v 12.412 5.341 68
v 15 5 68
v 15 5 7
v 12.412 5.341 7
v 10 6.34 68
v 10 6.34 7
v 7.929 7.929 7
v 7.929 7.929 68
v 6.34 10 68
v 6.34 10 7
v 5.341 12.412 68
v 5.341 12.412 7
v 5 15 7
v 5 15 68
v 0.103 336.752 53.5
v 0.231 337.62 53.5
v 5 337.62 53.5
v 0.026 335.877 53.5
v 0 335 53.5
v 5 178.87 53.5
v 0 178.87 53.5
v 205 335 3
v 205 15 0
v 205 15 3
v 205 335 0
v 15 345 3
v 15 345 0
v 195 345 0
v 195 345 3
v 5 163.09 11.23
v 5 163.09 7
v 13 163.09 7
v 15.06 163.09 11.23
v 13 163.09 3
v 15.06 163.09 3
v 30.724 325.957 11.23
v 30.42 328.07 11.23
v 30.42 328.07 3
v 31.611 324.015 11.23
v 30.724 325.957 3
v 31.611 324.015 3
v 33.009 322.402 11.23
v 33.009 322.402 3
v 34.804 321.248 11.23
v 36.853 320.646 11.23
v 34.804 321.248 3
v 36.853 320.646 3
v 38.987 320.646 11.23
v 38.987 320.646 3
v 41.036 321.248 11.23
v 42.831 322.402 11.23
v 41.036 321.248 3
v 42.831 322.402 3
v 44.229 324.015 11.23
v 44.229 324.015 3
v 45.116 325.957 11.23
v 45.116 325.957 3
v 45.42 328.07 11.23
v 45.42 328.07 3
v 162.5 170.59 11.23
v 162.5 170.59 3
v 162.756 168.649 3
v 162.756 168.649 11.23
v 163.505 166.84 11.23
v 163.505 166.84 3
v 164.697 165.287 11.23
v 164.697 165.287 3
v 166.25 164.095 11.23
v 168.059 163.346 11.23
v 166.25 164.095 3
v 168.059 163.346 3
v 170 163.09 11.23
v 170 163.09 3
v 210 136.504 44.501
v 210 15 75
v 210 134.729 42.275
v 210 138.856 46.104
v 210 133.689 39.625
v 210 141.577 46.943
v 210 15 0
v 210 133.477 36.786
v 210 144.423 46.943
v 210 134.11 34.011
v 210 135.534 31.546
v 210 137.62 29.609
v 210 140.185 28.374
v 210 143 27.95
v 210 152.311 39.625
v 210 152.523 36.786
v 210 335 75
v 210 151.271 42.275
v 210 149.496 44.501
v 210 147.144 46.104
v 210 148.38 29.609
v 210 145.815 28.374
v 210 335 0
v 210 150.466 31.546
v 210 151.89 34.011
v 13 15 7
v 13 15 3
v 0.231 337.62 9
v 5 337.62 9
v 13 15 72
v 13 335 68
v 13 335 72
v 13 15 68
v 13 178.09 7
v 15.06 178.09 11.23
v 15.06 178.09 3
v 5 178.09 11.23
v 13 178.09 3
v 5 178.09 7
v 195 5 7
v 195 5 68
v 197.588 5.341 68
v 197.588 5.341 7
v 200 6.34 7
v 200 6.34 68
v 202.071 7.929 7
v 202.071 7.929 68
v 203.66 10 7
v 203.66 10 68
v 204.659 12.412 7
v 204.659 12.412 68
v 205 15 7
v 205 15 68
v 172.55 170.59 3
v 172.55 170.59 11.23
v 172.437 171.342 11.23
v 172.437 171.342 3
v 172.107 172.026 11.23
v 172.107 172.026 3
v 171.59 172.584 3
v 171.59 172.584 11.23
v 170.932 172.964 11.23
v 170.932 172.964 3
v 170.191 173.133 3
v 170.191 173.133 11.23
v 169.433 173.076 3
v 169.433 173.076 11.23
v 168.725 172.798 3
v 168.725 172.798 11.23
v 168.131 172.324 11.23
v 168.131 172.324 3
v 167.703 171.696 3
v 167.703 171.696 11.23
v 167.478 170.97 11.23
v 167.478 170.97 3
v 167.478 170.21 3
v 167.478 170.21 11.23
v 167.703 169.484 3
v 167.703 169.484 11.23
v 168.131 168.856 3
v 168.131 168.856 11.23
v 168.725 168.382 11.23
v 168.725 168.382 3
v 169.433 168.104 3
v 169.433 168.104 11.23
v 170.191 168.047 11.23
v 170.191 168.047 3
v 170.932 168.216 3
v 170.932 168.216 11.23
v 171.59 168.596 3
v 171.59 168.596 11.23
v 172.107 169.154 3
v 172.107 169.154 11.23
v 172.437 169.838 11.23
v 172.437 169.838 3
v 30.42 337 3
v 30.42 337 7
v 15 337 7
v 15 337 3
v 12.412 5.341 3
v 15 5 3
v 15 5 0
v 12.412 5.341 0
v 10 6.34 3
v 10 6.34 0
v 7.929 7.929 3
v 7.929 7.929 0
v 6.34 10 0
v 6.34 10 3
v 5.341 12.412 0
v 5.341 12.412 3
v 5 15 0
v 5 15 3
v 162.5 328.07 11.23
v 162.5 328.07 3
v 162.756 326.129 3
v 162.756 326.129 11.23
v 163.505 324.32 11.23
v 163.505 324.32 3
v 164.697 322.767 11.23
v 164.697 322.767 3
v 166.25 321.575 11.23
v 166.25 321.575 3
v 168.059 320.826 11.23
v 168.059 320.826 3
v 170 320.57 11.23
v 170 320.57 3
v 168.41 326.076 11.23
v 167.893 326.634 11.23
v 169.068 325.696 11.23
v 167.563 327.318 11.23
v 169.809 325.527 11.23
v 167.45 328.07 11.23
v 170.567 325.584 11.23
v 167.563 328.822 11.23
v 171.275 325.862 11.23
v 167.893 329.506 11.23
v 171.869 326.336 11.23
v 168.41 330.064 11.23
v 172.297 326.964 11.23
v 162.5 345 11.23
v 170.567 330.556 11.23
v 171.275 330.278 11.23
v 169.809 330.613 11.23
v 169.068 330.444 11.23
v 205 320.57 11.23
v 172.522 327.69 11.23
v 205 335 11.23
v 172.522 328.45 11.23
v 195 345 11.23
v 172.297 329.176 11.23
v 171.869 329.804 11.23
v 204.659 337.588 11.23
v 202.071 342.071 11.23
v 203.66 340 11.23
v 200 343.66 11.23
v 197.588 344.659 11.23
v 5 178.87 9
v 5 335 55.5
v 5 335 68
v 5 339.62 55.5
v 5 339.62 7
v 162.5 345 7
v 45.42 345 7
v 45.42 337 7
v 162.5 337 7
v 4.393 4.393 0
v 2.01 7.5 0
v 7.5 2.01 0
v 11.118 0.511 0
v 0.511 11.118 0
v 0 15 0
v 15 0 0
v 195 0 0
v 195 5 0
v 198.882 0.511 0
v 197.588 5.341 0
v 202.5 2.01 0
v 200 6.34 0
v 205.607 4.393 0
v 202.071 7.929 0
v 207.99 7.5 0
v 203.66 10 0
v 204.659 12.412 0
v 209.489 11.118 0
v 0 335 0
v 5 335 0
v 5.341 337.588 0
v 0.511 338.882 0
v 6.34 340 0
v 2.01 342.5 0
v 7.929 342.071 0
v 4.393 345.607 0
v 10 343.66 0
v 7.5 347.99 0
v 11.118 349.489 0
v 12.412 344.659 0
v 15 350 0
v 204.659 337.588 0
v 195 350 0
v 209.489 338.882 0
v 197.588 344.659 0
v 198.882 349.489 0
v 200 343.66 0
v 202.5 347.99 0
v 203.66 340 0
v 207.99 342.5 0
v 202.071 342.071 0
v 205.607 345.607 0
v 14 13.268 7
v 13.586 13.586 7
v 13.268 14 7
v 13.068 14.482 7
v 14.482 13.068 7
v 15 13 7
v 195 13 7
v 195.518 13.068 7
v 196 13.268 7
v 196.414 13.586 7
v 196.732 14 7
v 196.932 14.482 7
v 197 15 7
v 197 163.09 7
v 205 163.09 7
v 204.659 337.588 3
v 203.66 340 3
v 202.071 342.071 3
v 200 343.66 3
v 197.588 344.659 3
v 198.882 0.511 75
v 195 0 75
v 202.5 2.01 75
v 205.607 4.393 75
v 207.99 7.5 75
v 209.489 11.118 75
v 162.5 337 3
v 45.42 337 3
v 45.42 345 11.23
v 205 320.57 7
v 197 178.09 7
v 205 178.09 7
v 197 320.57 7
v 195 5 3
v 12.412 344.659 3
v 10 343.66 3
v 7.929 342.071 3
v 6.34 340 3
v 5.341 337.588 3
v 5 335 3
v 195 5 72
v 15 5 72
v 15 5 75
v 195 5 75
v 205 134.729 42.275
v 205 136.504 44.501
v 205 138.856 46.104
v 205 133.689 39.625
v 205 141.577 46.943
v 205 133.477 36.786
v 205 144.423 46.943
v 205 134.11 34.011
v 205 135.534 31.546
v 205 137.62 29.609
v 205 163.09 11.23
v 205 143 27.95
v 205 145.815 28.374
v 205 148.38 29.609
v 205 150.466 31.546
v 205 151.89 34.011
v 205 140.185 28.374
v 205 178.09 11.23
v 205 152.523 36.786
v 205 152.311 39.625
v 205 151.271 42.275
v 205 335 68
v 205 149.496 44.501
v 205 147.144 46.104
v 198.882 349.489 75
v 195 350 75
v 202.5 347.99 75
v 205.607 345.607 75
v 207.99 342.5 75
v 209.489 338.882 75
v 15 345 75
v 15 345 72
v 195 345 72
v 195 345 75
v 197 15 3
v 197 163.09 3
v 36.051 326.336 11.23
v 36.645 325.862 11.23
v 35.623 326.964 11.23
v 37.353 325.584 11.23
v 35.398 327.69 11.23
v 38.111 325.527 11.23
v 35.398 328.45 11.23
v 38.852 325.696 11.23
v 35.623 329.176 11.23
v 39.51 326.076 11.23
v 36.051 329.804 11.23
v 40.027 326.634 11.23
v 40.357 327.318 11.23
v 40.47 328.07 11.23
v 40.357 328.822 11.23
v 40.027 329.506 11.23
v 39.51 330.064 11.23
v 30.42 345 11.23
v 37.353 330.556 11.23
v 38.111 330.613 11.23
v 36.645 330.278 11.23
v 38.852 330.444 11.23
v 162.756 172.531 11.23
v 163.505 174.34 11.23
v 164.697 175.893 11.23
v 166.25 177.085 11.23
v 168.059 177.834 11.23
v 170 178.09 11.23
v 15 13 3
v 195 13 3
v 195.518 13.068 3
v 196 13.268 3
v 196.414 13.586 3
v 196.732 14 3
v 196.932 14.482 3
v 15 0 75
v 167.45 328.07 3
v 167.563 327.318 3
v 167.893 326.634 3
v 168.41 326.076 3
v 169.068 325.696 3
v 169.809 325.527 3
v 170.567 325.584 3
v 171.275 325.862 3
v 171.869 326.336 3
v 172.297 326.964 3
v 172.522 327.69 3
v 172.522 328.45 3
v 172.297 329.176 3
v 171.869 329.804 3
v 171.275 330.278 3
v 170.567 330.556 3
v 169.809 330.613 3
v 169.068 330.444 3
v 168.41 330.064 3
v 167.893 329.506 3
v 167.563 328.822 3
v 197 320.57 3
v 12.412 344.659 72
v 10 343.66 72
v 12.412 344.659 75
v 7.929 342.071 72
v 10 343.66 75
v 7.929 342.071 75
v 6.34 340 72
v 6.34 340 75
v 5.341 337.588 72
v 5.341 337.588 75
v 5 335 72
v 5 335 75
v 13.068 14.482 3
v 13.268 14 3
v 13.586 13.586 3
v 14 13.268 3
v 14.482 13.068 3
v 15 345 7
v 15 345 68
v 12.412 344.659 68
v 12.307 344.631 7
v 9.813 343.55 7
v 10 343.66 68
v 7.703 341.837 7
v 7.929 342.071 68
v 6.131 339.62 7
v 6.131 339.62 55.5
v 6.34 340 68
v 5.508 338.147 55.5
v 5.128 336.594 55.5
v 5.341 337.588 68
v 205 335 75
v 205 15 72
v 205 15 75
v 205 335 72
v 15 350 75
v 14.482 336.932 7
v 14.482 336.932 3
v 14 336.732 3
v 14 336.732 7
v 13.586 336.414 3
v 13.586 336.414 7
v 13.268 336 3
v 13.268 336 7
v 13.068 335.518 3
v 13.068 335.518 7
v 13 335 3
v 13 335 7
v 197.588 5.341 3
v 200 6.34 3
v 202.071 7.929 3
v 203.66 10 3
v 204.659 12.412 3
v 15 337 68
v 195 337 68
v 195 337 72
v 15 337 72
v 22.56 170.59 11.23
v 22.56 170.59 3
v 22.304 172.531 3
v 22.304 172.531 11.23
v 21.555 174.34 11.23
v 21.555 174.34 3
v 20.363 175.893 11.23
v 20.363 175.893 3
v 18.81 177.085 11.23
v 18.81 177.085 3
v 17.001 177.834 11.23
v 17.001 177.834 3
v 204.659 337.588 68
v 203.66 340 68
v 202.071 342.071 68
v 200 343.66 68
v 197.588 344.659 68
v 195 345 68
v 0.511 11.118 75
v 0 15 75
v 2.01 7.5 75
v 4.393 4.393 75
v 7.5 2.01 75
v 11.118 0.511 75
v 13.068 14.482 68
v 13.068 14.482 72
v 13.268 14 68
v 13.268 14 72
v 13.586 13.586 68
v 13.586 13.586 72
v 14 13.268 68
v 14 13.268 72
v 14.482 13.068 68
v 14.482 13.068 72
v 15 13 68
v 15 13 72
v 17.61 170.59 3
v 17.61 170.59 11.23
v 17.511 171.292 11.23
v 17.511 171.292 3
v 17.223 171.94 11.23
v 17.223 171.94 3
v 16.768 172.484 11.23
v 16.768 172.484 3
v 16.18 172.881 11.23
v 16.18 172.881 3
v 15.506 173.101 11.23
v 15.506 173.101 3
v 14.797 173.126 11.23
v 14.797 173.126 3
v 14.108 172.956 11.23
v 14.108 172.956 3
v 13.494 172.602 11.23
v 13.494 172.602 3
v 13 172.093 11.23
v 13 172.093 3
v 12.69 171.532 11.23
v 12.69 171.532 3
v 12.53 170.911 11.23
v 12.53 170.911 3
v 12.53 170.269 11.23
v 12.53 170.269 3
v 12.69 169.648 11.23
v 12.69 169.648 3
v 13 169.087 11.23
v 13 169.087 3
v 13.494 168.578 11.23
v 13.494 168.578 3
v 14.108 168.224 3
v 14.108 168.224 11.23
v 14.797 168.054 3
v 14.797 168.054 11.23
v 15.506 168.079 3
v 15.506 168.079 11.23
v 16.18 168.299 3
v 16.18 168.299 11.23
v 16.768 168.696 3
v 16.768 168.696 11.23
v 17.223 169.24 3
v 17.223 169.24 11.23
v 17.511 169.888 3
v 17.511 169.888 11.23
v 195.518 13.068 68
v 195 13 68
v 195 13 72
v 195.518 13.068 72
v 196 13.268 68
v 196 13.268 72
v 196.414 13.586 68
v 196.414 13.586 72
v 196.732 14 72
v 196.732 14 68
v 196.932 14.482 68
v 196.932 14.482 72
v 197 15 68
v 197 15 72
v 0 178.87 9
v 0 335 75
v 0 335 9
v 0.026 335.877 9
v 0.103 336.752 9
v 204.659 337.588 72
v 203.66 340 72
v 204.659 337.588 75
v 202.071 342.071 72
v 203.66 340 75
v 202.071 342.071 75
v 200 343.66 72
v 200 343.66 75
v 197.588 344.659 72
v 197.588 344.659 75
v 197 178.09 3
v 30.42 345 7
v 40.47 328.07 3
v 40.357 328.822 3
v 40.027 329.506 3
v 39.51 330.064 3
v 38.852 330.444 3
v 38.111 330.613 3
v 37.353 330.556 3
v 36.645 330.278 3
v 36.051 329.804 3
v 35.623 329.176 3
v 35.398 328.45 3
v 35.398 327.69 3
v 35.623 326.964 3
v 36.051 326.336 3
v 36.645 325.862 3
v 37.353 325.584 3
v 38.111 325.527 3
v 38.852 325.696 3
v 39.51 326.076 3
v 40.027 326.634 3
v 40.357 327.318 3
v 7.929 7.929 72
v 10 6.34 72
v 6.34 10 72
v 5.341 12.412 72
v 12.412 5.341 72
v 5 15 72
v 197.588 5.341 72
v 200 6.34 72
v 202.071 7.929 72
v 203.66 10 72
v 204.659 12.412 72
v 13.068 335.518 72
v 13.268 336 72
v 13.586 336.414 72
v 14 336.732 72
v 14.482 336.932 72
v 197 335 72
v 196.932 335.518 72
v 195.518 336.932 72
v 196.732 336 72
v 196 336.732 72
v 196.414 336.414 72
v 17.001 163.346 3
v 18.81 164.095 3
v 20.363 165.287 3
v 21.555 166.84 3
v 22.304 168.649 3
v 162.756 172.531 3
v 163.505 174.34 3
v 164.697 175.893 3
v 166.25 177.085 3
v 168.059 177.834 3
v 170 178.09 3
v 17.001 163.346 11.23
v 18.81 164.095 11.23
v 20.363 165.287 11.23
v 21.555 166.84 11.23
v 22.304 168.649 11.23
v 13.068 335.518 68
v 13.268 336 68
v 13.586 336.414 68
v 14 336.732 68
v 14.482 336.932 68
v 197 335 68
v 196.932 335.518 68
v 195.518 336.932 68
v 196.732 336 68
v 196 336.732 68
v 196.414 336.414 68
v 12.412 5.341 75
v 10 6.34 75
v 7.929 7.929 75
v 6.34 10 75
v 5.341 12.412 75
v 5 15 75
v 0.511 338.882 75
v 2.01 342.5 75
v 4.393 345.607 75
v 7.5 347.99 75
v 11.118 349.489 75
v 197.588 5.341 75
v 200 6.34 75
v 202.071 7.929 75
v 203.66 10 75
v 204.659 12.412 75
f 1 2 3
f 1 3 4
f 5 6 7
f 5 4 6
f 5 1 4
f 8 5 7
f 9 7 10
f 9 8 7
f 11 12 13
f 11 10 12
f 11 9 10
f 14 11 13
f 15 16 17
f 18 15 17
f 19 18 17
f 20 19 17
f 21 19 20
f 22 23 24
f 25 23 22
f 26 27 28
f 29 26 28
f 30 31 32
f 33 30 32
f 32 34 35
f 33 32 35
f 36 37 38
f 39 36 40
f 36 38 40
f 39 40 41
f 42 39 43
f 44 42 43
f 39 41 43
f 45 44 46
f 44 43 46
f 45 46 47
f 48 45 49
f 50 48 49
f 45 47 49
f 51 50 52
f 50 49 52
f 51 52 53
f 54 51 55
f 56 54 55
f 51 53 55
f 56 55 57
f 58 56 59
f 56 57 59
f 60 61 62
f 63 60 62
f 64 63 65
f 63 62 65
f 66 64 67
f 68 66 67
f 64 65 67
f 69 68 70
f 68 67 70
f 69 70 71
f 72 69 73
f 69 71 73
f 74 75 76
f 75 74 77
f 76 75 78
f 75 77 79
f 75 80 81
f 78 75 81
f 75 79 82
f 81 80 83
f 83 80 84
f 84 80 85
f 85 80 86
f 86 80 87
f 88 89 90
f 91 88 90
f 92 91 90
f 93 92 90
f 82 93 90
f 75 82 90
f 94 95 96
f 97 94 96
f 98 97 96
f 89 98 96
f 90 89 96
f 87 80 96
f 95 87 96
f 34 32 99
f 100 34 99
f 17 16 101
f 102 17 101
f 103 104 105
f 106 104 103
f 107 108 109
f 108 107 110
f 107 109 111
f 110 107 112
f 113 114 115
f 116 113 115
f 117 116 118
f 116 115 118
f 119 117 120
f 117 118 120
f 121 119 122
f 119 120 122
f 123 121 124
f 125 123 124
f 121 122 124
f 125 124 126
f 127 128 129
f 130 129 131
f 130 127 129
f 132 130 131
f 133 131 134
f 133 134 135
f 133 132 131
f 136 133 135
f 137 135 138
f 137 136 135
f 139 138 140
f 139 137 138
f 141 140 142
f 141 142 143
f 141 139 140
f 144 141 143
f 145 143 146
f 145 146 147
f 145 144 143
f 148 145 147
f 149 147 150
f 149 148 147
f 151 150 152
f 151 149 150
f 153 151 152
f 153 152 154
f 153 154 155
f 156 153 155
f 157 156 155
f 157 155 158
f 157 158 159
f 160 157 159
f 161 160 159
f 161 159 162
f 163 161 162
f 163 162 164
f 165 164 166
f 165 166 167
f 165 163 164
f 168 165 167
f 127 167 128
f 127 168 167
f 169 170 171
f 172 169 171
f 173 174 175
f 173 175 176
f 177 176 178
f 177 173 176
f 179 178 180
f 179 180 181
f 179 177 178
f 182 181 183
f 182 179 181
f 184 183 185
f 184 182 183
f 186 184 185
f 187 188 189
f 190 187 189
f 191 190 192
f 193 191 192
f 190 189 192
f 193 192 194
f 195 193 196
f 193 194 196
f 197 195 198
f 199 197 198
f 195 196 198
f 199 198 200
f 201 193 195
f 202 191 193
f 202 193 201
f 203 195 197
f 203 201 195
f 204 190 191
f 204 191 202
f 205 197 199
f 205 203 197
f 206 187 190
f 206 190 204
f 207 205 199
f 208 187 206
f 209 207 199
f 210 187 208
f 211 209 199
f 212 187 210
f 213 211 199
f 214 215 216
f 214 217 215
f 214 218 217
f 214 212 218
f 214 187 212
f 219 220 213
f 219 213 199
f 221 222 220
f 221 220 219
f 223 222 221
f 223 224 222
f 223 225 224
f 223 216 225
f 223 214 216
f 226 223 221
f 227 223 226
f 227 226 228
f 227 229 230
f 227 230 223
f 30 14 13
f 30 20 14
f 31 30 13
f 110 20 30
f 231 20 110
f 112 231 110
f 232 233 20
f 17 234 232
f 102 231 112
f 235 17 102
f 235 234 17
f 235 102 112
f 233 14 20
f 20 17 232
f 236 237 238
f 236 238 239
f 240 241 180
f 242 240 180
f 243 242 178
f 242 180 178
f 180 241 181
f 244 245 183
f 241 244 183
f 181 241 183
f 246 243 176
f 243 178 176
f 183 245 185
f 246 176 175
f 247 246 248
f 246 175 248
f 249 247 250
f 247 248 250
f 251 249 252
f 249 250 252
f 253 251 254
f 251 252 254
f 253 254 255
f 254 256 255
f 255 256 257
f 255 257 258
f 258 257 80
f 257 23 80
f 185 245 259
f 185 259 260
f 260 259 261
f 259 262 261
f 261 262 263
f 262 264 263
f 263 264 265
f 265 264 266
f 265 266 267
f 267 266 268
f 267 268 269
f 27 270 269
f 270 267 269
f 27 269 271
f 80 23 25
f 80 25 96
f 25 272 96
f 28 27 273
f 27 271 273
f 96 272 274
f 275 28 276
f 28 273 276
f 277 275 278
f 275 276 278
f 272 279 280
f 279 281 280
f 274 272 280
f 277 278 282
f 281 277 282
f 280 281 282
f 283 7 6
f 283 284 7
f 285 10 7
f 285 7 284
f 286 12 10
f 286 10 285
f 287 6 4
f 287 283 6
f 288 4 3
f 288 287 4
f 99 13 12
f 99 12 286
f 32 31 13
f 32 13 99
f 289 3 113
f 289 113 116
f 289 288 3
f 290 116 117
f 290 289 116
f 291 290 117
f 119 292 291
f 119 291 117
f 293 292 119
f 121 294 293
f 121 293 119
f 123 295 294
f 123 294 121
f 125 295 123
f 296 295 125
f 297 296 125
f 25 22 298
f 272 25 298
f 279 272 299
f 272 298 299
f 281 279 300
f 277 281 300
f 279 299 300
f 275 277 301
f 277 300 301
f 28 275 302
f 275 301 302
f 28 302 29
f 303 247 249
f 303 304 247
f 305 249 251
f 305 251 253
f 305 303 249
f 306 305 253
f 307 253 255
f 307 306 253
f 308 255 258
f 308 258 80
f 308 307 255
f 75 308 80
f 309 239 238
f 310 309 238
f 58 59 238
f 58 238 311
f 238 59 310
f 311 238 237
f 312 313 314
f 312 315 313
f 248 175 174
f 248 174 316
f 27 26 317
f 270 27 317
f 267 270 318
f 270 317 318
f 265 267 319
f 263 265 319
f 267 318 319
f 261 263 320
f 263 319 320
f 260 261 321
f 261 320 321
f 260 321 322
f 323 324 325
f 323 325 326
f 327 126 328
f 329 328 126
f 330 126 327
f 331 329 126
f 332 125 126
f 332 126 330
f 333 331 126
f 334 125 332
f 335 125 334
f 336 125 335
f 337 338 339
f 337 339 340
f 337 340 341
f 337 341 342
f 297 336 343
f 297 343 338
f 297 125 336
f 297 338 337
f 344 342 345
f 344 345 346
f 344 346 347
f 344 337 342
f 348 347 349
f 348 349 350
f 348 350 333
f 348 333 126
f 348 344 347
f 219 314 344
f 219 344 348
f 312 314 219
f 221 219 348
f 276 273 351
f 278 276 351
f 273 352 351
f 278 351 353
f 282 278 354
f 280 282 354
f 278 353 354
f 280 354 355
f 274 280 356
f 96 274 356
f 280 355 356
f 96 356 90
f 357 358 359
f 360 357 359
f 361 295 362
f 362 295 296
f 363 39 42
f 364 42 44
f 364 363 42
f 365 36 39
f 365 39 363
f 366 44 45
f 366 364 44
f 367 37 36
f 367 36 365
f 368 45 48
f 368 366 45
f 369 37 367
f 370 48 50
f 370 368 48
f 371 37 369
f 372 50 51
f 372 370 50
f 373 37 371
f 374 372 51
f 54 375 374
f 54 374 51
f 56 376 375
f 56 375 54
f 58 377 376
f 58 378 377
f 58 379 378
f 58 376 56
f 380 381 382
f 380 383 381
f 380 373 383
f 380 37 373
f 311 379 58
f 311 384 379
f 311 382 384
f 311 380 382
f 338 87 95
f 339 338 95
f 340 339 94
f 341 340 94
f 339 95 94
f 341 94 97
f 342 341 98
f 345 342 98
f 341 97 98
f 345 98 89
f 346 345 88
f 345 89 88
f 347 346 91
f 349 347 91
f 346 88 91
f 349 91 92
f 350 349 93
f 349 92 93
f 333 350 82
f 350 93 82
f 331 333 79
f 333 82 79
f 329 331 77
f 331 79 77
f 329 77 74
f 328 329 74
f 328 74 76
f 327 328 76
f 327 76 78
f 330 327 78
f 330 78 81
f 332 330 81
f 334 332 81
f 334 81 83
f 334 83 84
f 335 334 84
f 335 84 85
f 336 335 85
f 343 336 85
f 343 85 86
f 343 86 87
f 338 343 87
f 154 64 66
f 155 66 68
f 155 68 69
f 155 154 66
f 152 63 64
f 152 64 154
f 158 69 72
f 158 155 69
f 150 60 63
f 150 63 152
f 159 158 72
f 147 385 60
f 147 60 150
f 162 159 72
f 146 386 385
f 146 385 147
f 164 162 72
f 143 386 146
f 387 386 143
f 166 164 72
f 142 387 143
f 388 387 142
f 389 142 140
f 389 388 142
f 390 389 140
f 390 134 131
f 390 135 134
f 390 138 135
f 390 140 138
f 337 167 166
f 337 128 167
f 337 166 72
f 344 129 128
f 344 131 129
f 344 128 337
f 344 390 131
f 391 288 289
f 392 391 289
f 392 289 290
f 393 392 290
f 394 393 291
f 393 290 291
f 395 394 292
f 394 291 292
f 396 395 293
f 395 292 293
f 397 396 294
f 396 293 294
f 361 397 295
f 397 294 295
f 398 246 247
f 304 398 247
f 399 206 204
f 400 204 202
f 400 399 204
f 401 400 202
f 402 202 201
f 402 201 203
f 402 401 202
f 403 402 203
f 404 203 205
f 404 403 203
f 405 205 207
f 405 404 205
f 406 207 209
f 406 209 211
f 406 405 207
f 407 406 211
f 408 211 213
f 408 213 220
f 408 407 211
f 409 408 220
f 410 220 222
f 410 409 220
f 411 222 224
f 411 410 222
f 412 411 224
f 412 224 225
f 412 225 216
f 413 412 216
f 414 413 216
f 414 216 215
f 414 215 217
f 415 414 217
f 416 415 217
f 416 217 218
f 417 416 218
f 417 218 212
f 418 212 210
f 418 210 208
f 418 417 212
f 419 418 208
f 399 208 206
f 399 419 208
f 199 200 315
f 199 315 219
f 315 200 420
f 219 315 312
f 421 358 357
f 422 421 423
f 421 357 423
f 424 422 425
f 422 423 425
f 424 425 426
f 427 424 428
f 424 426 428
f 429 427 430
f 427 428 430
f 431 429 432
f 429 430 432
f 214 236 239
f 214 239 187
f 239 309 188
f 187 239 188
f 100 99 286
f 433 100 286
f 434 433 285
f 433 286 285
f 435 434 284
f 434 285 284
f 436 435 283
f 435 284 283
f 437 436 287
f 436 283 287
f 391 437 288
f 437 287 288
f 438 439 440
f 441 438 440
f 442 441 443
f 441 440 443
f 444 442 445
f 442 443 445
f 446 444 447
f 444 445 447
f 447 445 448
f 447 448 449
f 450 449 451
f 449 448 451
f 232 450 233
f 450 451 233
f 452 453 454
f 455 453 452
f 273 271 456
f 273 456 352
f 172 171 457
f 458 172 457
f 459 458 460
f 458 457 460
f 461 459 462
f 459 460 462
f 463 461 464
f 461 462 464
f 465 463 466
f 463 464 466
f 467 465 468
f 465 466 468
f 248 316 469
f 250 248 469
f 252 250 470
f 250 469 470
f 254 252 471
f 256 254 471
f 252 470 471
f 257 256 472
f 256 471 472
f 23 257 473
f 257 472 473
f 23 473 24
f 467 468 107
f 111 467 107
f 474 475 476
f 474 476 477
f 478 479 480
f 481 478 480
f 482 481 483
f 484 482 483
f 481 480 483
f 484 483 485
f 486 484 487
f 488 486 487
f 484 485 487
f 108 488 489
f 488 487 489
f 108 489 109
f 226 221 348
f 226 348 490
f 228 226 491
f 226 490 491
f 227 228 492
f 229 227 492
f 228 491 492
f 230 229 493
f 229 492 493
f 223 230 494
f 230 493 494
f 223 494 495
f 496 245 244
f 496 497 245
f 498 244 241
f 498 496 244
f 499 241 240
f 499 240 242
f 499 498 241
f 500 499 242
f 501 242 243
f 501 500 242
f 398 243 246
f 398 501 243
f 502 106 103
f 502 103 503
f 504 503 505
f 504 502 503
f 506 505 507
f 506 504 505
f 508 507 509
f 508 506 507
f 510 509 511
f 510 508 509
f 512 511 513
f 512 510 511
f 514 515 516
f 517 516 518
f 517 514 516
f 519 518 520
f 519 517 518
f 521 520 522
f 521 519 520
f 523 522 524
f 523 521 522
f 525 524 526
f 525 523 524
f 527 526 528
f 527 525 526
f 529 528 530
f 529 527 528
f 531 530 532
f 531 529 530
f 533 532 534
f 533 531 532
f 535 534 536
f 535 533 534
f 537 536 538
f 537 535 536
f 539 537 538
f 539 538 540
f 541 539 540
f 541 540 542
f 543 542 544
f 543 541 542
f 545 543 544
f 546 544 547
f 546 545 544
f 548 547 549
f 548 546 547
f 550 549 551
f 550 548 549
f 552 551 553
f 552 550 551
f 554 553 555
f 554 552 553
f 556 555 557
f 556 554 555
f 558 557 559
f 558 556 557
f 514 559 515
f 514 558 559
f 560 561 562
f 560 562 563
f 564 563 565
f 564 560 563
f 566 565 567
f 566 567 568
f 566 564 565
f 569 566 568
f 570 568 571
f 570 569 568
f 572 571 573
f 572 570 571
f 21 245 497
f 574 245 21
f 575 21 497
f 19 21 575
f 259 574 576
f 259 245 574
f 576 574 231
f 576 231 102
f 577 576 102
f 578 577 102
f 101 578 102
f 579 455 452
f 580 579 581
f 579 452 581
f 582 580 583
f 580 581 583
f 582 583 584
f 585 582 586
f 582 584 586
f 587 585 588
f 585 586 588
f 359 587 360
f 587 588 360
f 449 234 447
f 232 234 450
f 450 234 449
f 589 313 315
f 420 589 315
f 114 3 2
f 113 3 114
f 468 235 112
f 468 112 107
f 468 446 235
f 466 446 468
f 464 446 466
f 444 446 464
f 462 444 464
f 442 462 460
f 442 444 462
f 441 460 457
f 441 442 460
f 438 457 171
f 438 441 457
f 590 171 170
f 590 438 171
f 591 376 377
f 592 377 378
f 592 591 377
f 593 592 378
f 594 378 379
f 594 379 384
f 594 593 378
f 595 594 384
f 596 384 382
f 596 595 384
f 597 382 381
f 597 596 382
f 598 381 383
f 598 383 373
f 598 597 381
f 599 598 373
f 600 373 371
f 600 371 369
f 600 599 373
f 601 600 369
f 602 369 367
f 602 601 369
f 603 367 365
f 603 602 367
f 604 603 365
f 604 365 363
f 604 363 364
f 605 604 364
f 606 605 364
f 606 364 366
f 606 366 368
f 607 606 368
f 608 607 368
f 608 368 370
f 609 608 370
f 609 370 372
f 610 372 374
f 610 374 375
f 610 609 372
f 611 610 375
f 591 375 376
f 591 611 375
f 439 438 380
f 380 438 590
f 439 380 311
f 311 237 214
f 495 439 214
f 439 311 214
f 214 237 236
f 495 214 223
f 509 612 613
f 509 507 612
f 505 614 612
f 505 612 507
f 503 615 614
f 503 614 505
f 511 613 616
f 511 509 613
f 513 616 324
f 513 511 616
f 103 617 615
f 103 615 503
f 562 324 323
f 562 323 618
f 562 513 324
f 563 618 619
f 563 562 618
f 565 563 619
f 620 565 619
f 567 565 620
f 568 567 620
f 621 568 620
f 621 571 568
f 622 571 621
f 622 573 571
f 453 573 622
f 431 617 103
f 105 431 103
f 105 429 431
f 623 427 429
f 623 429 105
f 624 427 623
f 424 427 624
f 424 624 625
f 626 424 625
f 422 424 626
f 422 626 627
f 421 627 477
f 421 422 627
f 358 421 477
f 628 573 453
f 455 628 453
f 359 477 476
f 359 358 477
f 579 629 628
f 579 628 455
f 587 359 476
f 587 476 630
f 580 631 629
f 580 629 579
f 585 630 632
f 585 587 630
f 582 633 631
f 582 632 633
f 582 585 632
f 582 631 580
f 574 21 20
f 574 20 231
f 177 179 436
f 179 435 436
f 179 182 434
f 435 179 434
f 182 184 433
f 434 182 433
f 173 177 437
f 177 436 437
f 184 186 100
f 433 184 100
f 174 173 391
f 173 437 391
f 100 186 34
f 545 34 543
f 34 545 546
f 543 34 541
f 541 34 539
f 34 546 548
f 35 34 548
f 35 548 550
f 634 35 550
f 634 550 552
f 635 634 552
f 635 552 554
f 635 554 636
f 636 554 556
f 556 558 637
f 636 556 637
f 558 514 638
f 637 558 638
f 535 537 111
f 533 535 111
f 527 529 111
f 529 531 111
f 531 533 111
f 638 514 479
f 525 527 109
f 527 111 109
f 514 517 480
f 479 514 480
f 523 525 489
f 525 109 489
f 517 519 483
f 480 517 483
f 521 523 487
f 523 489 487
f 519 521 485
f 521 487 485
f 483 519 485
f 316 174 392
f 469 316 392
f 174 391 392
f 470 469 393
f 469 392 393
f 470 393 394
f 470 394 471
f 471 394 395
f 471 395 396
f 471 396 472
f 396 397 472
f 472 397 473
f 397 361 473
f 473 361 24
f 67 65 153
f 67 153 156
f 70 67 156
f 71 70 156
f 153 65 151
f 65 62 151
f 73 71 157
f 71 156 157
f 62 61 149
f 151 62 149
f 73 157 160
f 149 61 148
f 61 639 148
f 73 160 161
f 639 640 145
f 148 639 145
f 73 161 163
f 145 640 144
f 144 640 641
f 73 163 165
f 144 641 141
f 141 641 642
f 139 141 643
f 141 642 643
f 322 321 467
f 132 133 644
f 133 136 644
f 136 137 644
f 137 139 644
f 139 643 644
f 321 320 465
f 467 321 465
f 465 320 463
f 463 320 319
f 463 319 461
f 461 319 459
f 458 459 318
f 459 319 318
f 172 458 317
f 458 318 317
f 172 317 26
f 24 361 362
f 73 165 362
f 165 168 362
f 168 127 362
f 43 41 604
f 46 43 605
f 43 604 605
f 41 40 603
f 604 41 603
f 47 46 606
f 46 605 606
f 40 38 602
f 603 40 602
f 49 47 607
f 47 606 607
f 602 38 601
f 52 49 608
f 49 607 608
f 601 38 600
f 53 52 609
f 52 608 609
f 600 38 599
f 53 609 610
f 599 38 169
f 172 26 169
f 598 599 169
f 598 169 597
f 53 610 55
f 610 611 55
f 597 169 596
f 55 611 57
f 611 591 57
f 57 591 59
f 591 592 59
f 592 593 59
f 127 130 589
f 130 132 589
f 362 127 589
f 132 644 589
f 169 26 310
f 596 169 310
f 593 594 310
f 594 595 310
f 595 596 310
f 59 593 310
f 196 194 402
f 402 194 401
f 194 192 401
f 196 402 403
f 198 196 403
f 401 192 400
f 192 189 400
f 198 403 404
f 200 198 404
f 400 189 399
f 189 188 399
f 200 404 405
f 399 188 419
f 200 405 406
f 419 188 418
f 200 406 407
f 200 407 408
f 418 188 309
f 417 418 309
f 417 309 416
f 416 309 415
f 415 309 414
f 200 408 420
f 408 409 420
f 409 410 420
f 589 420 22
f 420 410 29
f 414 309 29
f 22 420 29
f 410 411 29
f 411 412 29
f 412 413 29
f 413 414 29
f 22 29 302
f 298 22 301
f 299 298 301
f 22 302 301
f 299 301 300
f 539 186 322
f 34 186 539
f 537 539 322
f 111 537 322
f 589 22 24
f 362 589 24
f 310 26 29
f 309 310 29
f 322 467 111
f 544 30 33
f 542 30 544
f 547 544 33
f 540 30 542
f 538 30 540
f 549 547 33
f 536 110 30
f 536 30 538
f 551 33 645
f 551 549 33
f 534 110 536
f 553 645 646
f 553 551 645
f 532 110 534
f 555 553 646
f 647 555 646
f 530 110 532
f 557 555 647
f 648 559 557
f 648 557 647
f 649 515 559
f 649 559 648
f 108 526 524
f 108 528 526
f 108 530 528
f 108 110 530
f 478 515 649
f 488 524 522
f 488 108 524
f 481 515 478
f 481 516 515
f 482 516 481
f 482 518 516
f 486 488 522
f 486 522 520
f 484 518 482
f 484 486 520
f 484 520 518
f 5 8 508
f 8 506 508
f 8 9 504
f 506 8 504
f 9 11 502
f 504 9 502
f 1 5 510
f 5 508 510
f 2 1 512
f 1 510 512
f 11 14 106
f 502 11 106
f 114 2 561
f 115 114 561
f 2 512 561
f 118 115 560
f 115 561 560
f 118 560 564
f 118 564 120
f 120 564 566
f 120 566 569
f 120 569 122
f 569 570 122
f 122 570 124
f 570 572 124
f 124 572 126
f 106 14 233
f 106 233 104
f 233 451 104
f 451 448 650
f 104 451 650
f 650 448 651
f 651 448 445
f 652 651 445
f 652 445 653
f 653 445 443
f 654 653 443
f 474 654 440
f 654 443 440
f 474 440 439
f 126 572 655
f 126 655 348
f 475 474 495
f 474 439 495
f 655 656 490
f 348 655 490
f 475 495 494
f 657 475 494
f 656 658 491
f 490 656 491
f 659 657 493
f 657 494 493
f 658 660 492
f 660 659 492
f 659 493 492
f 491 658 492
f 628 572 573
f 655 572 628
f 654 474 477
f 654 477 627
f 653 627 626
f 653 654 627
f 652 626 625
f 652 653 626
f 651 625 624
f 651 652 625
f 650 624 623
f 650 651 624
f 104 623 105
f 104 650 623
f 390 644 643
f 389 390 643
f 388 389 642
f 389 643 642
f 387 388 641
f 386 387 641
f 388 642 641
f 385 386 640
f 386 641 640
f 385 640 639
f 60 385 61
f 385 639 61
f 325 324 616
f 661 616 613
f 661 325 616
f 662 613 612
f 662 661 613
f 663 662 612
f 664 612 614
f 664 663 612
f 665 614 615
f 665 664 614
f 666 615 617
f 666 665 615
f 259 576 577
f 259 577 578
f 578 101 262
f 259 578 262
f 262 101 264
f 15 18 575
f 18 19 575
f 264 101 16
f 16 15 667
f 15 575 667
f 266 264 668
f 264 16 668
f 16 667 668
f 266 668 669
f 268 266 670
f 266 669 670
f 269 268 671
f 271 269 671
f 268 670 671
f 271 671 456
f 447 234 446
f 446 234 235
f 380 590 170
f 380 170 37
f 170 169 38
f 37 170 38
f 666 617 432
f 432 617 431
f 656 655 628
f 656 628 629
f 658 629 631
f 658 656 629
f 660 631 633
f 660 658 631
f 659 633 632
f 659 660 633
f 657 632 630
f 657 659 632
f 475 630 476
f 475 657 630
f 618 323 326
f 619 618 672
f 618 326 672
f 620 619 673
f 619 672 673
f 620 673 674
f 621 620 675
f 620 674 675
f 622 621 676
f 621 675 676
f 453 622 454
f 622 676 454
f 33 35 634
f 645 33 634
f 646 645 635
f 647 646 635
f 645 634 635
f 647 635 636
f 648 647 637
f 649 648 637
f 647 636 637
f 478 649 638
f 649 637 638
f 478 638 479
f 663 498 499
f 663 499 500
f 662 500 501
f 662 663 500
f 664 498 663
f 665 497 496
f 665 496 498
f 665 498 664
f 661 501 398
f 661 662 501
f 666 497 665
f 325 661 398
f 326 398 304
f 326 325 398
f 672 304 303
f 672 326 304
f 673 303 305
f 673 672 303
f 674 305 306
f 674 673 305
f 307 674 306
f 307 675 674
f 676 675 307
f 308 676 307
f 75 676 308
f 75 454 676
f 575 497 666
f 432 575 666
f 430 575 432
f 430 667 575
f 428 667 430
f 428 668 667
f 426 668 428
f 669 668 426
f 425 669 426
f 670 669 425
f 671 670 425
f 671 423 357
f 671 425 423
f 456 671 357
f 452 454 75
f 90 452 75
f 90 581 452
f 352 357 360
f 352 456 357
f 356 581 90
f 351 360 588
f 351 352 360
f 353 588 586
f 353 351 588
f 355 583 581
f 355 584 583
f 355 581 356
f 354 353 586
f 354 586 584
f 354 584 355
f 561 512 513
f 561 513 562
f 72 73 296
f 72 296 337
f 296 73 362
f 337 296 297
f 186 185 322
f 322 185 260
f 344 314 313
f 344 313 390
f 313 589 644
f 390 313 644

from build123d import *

# Parameters (mm, degrees)
SKETCH1_W               = 210
SKETCH1_H               = 350
SKETCH1_W_2             = 200
SKETCH1_H_2             = 340
BOSS_EXTRUDE1_DEPTH     = 75
FILLET1_R               = 15
FILLET2_R               = 10
BOSS_EXTRUDE2_START     = -4
BOSS_EXTRUDE2_DEPTH     = 4
CUT_EXTRUDE1_DEPTH      = 4
CUT_EXTRUDE1_DEPTH_BACK = 25
SKETCH3_W               = 44.5
SKETCH3_H               = 156.13
SKETCH3_H_2             = 2.62
SKETCH4_W               = 2
SKETCH4_H               = 2.62
CUT_EXTRUDE2_DEPTH      = 18
BOSS_EXTRUDE4_START     = -4
SKETCH5_R               = 2.55
BOSS_EXTRUDE4_DEPTH     = 8.23
SKETCH6_R               = 9.55
CUT_EXTRUDE4_DEPTH      = 22
CUT_EXTRUDE5_START      = -22
CUT_EXTRUDE5_DEPTH      = 22


with BuildPart() as part:
    # Sketch1 → Boss-Extrude1 (new body)
    with BuildSketch(Plane.XY):
        with Locations((105, 175)):
            Rectangle(SKETCH1_W, SKETCH1_H)
        with Locations((105, 175)):
            Rectangle(SKETCH1_W_2, SKETCH1_H_2, mode=Mode.SUBTRACT)
    extrude(amount=BOSS_EXTRUDE1_DEPTH)

    # Fillet1
    fillet1_edges = [part.edges().sort_by_distance(p)[0] for p in [
        (0, 350, 37.5),
        (210, 350, 37.5),
        (210, 0, 37.5),
        (0, 0, 37.5),
    ]]
    fillet(fillet1_edges, radius=FILLET1_R)

    # Fillet2
    fillet2_edges = [part.edges().sort_by_distance(p)[0] for p in [
        (5, 5, 37.5),
        (205, 5, 37.5),
        (205, 345, 37.5),
        (5, 345, 37.5),
    ]]
    fillet(fillet2_edges, radius=FILLET2_R)

    # Sketch2 → Boss-Extrude2 (add)
    with BuildSketch(Plane(origin=(0, 0, 3), x_dir=(-1, 0, 0), z_dir=(0, 0, -1)).offset(BOSS_EXTRUDE2_START)):
        with BuildLine():
            Line((-15, 5), (-195, 5))
            ThreePointArc((-195, 5), (-202.071067812, 7.928932188), (-205, 15))
            Line((-205, 15), (-205, 335))
            ThreePointArc((-205, 335), (-202.071067812, 342.071067812), (-195, 345))
            Line((-195, 345), (-15, 345))
            ThreePointArc((-15, 345), (-7.928932188, 342.071067812), (-5, 335))
            Line((-5, 335), (-5, 15))
            ThreePointArc((-5, 15), (-7.928932188, 7.928932188), (-15, 5))
        make_face()
        with BuildLine():
            Line((-13, 335), (-13, 15))
            ThreePointArc((-13, 15), (-13.585786438, 13.585786438), (-15, 13))
            Line((-15, 13), (-195, 13))
            ThreePointArc((-195, 13), (-196.414213562, 13.585786438), (-197, 15))
            Line((-197, 15), (-197, 335))
            ThreePointArc((-197, 335), (-196.414213562, 336.414213562), (-195, 337))
            Line((-195, 337), (-15, 337))
            ThreePointArc((-15, 337), (-13.585786438, 336.414213562), (-13, 335))
        make_face(mode=Mode.SUBTRACT)
    boss_extrude2 = extrude(amount=BOSS_EXTRUDE2_DEPTH)

    # Mirror1: Boss-Extrude2 across plane
    add(boss_extrude2.mirror(Plane(origin=(0, 0, 37.5), x_dir=(1, 0, 0), z_dir=(0, 0, -1))))

    # Sketch3 → Cut-Extrude1 (cut, two sides: drawn at the far end of the back side and taken through both)
    with BuildSketch(Plane(origin=(5, 0, 0), x_dir=(0, 0, -1), z_dir=(1, 0, 0)).offset(-CUT_EXTRUDE1_DEPTH_BACK)):
        with Locations((-31.25, 256.935)):
            Rectangle(SKETCH3_W, SKETCH3_H)
        with Locations((-31.25, 336.31)):
            Rectangle(SKETCH3_W, SKETCH3_H_2)
    extrude(amount=CUT_EXTRUDE1_DEPTH + CUT_EXTRUDE1_DEPTH_BACK, mode=Mode.SUBTRACT)

    # Sketch4 → Cut-Extrude2 (cut)
    with BuildSketch(Plane(origin=(5, 0, 0), x_dir=(0, 0, -1), z_dir=(1, 0, 0))):
        with Locations((-54.5, 336.31)):
            Rectangle(SKETCH4_W, SKETCH4_H)
        Polygon((-9, 337.62), (-53.5, 337.62), (-55.5, 337.62), (-55.5, 339.62), (-7, 339.62), (-7, 337.62), align=None)
        with Locations((-8, 336.31)):
            Rectangle(SKETCH4_W, SKETCH4_H)
    extrude(amount=CUT_EXTRUDE2_DEPTH, mode=Mode.SUBTRACT)

    # Sketch5 → Boss-Extrude4 (add)
    # profile 1 of 4: a face of its own
    with BuildSketch(Plane.XY.offset(7).offset(BOSS_EXTRUDE4_START)):
        with BuildLine():
            Line((15.06, 178.09), (5, 178.09))
            Line((5, 178.09), (5, 163.09))
            Line((5, 163.09), (15.06, 163.09))
            ThreePointArc((15.06, 163.09), (20.363300859, 165.286699141), (22.56, 170.59))
            ThreePointArc((22.56, 170.59), (20.363300859, 175.893300859), (15.06, 178.09))
        make_face()
        with Locations((15.06, 170.59)):
            Circle(SKETCH5_R, mode=Mode.SUBTRACT)
    # profile 2 of 4: a face of its own
    with BuildSketch(Plane.XY.offset(7).offset(BOSS_EXTRUDE4_START)):
        with BuildLine():
            Line((205, 163.09), (205, 178.09))
            Line((205, 178.09), (170, 178.09))
            ThreePointArc((170, 178.09), (164.696699141, 175.893300859), (162.5, 170.59))
            ThreePointArc((162.5, 170.59), (164.696699141, 165.286699141), (170, 163.09))
            Line((170, 163.09), (205, 163.09))
        make_face()
        with Locations((170, 170.59)):
            Circle(SKETCH5_R, mode=Mode.SUBTRACT)
    # profile 3 of 4: a face of its own
    with BuildSketch(Plane.XY.offset(7).offset(BOSS_EXTRUDE4_START)):
        with BuildLine():
            Line((195, 345), (162.5, 345))
            Line((162.5, 345), (162.5, 328.07))
            ThreePointArc((162.5, 328.07), (164.696699141, 322.766699141), (170, 320.57))
            Line((170, 320.57), (205, 320.57))
            Line((205, 320.57), (205, 335))
            ThreePointArc((205, 335), (202.071067812, 342.071067812), (195, 345))
        make_face()
        with Locations(Location((170, 328.07, 0), (0, 0, 180))):
            Circle(SKETCH5_R, mode=Mode.SUBTRACT)
    # profile 4 of 4: a face of its own
    with BuildSketch(Plane.XY.offset(7).offset(BOSS_EXTRUDE4_START)):
        with BuildLine():
            Line((45.42, 345), (30.42, 345))
            Line((30.42, 345), (30.42, 328.07))
            ThreePointArc((30.42, 328.07), (37.92, 320.57), (45.42, 328.07))
            Line((45.42, 328.07), (45.42, 345))
        make_face()
        with Locations((37.92, 328.07)):
            Circle(SKETCH5_R, mode=Mode.SUBTRACT)
    extrude(amount=BOSS_EXTRUDE4_DEPTH)

    # Sketch6 → Cut-Extrude4 (cut)
    with BuildSketch(Plane(origin=(210, 0, 0), x_dir=(0, 0, -1), z_dir=(1, 0, 0))):
        with Locations((-37.5, 143)):
            Circle(SKETCH6_R)
    extrude(amount=-CUT_EXTRUDE4_DEPTH, mode=Mode.SUBTRACT)

    # Sketch7 → Cut-Extrude5 (cut)
    with BuildSketch(Plane.XY.offset(11.23).offset(CUT_EXTRUDE5_START)):
        with BuildLine():
            Line((13, 169.087036261), (13, 172.092963739))
            ThreePointArc((13, 172.092963739), (12.51, 170.59), (13, 169.087036261))
        make_face()
    extrude(amount=CUT_EXTRUDE5_DEPTH, mode=Mode.SUBTRACT)


solid = part.part
